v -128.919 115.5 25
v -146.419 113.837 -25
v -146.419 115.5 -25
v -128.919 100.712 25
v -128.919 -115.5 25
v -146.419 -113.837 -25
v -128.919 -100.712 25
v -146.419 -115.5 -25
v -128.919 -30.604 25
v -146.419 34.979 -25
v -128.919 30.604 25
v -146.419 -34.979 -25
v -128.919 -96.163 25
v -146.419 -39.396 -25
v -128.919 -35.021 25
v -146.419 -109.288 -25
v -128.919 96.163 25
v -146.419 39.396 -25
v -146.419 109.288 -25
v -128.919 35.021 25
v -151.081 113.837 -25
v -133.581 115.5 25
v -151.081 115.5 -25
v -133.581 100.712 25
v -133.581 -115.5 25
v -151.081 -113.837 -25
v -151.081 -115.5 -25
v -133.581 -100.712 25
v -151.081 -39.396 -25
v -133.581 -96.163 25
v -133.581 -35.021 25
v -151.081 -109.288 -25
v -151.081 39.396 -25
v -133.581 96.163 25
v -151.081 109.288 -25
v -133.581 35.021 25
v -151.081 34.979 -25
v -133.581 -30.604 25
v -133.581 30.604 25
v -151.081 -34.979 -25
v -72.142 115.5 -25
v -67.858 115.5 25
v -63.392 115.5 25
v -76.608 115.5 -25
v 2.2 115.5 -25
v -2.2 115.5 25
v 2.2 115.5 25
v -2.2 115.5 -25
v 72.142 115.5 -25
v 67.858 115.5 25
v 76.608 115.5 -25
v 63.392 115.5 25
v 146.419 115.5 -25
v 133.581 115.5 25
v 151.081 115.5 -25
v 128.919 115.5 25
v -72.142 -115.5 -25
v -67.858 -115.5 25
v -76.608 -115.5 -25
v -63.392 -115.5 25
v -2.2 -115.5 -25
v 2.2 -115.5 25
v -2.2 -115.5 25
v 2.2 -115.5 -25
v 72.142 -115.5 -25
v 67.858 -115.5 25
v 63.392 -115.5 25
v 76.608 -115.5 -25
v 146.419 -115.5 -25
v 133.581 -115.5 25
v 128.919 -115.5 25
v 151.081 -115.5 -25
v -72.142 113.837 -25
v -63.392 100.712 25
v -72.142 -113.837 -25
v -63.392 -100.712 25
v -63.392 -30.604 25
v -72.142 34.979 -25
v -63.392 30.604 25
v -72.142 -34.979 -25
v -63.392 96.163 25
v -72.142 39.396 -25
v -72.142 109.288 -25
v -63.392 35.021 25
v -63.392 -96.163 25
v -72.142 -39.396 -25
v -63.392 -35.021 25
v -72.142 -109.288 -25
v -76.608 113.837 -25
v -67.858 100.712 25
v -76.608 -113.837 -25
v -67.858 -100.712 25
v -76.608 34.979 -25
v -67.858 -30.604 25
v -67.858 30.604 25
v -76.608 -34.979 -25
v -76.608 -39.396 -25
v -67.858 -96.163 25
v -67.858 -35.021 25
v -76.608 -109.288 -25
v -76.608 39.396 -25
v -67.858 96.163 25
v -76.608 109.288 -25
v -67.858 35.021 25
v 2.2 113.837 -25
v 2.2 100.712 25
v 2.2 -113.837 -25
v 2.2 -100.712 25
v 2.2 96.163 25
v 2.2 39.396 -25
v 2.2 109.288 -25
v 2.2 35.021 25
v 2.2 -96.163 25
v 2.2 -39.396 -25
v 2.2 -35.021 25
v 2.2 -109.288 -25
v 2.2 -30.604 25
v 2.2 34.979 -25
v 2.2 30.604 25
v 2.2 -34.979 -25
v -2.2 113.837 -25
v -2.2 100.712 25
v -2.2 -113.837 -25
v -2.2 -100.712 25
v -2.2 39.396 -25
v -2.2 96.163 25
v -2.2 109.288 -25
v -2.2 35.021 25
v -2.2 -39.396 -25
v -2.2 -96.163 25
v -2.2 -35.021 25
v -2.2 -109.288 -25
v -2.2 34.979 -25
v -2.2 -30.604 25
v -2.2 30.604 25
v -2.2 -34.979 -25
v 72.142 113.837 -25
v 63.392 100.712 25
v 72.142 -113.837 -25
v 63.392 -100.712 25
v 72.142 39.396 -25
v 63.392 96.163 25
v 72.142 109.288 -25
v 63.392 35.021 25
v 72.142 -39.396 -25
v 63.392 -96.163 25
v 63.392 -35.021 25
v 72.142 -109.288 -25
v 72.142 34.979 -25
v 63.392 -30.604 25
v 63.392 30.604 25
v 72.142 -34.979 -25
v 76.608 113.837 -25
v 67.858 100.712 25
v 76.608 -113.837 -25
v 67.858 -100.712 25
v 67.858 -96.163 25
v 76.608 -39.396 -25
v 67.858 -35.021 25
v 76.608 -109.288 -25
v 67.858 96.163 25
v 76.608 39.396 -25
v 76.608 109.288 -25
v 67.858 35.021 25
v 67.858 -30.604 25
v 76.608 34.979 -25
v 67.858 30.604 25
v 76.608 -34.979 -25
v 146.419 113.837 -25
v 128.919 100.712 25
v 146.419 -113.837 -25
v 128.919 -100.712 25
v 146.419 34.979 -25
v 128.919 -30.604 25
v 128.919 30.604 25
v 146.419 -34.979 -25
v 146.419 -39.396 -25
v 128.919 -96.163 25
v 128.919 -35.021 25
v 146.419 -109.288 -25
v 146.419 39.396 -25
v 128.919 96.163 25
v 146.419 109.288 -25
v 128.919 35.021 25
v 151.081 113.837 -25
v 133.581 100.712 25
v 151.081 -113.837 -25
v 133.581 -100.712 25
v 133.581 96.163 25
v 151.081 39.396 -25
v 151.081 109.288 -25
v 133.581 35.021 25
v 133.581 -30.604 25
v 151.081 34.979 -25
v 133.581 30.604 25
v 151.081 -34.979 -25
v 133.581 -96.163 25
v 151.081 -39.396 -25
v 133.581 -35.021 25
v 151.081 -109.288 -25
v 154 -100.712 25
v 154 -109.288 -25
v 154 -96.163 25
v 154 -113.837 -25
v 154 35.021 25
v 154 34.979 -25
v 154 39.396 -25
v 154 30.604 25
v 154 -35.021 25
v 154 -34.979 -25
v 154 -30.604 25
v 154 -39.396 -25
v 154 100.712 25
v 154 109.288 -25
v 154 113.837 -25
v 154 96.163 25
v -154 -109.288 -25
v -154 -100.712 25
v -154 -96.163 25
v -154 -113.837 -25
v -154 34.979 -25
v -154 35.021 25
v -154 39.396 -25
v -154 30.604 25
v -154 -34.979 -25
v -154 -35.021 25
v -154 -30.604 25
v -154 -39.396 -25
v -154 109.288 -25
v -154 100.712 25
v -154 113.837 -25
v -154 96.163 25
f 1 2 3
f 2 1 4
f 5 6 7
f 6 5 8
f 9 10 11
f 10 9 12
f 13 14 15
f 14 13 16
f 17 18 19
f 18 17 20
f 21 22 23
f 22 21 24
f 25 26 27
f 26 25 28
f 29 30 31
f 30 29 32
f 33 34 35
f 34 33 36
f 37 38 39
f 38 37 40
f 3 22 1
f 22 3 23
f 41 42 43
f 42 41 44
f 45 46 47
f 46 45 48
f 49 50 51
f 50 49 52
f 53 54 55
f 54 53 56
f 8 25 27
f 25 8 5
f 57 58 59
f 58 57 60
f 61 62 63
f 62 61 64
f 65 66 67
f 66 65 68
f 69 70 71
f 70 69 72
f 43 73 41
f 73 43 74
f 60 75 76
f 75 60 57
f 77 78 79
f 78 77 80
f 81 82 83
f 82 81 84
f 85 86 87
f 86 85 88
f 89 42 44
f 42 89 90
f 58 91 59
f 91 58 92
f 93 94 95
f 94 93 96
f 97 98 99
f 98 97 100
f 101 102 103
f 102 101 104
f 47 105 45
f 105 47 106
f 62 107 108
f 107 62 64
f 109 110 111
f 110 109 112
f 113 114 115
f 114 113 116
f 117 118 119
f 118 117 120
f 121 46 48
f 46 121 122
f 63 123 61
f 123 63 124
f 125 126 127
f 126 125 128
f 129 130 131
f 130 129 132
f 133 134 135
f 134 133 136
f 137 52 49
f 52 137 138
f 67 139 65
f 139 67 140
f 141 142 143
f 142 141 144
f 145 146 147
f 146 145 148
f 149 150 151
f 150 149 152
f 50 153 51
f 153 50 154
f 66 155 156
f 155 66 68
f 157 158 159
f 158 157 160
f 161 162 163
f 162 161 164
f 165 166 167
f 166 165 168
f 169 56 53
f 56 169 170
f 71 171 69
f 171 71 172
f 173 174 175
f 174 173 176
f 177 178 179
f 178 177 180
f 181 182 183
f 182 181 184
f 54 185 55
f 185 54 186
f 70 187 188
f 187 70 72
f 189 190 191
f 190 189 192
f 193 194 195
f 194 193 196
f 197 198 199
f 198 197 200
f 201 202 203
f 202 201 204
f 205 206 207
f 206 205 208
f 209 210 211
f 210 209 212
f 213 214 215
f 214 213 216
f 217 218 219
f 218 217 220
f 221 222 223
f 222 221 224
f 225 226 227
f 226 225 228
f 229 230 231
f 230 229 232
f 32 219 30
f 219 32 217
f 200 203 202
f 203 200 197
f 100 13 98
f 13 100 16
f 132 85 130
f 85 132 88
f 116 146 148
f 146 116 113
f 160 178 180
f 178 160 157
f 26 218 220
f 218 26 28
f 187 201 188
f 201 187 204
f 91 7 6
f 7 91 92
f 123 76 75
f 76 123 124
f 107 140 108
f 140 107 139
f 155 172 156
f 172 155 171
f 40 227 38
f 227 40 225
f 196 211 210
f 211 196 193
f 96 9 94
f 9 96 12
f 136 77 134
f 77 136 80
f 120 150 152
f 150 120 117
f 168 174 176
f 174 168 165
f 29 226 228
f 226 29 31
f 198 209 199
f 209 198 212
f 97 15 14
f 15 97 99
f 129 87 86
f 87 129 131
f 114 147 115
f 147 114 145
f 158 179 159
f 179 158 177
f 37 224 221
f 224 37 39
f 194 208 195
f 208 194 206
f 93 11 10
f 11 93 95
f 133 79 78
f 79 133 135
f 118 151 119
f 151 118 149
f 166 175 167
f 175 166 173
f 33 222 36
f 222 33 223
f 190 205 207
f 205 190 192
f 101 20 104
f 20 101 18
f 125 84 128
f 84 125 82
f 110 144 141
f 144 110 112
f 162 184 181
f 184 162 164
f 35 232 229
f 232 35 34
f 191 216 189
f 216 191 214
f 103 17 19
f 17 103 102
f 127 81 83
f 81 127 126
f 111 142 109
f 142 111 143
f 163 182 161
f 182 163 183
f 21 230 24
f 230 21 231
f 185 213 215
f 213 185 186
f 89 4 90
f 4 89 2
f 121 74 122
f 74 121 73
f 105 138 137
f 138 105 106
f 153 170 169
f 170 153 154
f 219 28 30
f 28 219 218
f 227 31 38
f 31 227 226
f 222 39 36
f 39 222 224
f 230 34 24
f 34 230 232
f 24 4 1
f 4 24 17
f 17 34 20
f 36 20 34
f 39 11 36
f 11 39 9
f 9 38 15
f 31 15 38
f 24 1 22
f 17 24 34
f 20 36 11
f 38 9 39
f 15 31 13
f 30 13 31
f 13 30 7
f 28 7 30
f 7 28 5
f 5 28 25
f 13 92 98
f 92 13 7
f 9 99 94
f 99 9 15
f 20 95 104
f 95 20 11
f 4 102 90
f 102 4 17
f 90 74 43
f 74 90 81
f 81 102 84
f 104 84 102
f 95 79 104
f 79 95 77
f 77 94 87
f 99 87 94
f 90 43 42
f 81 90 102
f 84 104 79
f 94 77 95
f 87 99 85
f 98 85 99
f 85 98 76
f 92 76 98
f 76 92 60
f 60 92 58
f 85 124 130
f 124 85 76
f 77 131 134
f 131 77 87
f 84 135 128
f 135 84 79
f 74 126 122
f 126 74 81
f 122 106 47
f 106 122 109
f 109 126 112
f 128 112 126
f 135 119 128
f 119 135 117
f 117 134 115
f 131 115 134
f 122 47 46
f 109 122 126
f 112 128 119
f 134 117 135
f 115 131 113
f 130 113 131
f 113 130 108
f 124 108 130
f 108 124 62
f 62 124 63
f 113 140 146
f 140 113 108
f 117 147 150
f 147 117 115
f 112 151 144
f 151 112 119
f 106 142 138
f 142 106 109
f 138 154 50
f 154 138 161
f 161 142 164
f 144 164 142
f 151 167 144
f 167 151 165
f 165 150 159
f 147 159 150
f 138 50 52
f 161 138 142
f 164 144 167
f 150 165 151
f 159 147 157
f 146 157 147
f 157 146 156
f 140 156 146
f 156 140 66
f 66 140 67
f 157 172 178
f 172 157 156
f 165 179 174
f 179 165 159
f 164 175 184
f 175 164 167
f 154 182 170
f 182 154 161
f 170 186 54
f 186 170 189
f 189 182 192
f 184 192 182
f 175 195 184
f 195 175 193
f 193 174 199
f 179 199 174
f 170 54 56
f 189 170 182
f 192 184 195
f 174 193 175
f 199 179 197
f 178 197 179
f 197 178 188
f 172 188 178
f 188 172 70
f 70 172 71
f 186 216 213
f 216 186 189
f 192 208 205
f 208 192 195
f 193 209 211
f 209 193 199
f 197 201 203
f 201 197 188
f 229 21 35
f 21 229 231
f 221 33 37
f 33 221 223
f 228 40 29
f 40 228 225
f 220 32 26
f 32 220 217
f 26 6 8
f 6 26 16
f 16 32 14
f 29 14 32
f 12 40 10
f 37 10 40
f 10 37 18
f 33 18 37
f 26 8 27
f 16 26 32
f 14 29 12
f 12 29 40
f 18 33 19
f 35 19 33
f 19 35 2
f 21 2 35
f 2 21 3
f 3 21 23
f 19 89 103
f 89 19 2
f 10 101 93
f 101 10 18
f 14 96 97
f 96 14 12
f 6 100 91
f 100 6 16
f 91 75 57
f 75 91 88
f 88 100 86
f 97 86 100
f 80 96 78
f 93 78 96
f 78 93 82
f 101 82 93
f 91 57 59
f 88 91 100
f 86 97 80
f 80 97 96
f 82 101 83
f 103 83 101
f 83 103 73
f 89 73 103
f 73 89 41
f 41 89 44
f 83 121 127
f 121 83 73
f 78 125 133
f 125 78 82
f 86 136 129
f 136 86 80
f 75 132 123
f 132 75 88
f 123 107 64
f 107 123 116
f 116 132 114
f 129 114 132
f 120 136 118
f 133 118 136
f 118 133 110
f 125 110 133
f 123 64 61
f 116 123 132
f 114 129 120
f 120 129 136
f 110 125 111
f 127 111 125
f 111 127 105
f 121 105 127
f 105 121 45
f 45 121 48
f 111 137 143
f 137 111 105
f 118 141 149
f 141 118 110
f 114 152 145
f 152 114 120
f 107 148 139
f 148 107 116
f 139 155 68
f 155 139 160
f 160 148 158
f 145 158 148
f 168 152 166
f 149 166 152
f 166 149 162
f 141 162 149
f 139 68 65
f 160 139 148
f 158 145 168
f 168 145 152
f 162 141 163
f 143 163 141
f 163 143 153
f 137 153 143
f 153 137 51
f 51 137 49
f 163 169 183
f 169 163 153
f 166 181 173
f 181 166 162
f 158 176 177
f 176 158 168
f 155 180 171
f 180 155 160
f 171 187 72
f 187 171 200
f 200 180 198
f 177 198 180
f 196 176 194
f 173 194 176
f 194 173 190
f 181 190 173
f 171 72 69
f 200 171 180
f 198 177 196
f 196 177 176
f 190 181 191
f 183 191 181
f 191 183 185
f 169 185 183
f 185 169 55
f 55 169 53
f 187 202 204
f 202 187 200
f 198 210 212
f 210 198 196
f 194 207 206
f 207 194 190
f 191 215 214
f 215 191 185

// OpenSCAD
//!OpenSCAD

thickness = 4;
depth = 210;
width = 280;
camera_dist = 400;
n_rows = 3;
n_cols = 4;
height = 50;

intersection() {
  union(){
    for (i = [0 : abs(1) : n_cols]) {
      x_shift = i * (width / n_cols) - width / 2;
      translate([x_shift, 0, 0]){
        rotate([0, (-atan(x_shift / camera_dist)), 0]){
          scale([1.1, 1.1, 2]){
            cube([thickness, depth, height], center=true);
          }
        }
      }
    }

    for (i = [0 : abs(1) : n_rows]) {
      y_shift = i * (depth / n_rows) - depth / 2;
      translate([0, y_shift, 0]){
        rotate([(atan(y_shift / camera_dist)), 0, 0]){
          scale([1.1, 1.1, 2]){
            cube([width, thickness, height], center=true);
          }
        }
      }
    }

  }

  scale([1.1, 1.1, 1]){
    cube([width, depth, height], center=true);
  }

}
